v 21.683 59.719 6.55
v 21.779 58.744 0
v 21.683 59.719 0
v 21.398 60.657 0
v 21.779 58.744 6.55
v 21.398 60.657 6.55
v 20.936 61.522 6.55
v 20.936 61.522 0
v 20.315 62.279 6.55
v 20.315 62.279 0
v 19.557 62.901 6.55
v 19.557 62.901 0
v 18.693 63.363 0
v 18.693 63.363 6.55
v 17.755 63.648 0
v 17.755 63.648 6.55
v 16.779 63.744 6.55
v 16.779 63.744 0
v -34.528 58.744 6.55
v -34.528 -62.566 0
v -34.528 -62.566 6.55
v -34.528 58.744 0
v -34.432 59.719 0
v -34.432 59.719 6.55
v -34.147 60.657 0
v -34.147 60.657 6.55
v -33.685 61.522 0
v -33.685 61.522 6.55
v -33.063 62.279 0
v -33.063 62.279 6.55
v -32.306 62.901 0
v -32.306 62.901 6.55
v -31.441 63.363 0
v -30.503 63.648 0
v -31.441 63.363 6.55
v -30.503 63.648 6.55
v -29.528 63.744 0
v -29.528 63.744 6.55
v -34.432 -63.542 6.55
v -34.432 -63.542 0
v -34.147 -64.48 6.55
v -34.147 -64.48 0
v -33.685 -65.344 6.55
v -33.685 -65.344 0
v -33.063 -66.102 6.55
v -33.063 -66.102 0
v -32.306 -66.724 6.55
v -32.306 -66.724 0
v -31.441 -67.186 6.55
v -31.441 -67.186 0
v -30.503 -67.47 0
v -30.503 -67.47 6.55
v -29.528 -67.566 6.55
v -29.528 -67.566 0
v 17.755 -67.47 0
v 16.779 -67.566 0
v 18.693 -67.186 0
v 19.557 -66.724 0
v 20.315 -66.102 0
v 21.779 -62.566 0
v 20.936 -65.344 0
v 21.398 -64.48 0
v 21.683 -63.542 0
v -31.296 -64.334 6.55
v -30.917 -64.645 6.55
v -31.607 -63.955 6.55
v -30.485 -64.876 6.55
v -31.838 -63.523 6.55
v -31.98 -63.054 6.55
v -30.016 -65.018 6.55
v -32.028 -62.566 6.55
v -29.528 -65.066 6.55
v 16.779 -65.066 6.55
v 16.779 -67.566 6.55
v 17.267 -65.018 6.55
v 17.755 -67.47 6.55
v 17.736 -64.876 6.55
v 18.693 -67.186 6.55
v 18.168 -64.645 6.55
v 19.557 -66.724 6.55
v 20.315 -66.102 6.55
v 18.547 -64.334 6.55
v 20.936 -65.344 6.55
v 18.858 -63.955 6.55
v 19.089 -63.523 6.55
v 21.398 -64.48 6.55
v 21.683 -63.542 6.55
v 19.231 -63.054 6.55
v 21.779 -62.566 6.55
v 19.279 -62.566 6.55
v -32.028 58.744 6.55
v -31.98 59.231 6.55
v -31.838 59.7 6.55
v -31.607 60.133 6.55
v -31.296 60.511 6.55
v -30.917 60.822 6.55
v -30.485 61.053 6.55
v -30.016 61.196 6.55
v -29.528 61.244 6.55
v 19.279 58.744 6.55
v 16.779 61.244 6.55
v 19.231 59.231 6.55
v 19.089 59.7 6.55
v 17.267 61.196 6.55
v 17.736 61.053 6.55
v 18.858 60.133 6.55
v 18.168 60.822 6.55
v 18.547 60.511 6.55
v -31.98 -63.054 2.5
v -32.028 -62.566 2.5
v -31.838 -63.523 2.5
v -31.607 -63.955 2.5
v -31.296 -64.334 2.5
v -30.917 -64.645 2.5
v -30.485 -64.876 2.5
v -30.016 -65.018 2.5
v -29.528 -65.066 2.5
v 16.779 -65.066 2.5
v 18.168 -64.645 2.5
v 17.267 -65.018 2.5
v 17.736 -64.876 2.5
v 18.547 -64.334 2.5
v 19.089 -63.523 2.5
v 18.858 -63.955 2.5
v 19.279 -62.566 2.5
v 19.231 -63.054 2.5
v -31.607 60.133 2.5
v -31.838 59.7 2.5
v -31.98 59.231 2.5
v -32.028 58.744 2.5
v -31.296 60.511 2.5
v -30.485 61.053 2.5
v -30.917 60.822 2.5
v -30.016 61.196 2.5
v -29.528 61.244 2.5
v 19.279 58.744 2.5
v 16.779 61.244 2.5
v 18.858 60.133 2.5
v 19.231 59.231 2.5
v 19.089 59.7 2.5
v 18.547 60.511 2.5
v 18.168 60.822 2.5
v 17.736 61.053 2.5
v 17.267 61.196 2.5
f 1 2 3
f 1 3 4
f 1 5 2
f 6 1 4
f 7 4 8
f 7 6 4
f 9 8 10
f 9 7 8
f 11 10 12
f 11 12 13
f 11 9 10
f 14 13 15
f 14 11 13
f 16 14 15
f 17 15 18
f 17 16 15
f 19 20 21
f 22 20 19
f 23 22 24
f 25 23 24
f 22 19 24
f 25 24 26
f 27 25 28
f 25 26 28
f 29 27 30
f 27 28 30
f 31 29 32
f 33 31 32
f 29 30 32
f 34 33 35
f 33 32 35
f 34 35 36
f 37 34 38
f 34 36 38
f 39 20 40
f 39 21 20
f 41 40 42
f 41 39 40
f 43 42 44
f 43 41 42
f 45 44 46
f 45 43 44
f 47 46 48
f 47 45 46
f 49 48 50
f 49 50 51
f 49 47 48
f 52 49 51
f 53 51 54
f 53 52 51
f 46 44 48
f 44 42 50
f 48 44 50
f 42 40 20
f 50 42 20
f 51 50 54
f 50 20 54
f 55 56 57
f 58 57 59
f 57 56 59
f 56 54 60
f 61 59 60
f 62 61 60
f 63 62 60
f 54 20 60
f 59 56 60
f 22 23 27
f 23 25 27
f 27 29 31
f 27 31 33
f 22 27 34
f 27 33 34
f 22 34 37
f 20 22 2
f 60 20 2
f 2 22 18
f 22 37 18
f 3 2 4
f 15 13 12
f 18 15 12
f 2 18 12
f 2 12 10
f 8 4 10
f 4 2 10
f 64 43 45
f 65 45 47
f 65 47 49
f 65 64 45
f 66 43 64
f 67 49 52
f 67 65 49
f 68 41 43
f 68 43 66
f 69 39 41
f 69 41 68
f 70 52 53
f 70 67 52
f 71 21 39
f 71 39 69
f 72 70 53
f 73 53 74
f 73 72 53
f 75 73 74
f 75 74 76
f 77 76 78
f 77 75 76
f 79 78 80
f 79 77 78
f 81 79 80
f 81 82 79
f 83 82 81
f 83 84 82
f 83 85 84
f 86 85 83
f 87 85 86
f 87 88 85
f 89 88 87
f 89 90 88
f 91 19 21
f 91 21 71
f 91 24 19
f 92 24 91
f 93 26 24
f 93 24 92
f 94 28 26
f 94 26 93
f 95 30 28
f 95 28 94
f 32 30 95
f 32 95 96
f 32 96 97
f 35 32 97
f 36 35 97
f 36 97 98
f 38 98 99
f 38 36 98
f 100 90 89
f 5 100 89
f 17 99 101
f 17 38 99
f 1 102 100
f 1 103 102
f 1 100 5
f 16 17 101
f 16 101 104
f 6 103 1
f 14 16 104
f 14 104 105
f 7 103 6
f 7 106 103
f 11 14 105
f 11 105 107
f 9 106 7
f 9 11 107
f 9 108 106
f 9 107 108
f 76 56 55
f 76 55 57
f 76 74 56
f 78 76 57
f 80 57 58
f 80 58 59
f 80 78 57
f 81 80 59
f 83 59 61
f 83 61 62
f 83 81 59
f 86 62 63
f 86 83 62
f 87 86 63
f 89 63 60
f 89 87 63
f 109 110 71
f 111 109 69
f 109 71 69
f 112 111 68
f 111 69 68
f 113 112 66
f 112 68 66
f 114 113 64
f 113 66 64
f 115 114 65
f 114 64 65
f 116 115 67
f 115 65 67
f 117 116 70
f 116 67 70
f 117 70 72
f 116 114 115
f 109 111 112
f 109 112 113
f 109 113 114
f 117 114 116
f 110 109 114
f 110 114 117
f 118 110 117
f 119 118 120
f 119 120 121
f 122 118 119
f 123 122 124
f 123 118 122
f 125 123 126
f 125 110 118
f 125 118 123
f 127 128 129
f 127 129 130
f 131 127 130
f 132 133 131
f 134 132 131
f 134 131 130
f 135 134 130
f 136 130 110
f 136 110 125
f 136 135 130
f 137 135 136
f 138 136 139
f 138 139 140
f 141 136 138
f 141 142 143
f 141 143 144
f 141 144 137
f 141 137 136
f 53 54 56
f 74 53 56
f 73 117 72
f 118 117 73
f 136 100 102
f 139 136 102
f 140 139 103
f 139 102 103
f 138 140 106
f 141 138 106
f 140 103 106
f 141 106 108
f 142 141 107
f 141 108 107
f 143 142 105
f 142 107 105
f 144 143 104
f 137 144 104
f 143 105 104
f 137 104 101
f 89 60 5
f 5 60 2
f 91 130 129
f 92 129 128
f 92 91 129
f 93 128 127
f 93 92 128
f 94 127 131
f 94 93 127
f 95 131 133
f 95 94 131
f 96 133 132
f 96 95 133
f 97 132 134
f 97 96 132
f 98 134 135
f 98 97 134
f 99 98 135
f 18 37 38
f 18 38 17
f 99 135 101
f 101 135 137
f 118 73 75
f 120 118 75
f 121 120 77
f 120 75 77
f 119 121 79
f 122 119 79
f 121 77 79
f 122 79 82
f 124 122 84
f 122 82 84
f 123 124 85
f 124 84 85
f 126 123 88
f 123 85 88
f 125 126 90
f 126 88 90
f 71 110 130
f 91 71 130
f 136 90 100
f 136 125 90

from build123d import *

# Parameters (mm, degrees)
F0_W     = 56.306915
F0_H     = 131.31
F1_DEPTH = 6.55
F2_R     = 5
F3_T     = -2.5


with BuildPart() as f1:
    # F0 (on Top) → F1 (new body)
    with BuildSketch(Plane.XY):
        with Locations((-6.374369, -1.911319)):
            Rectangle(F0_W, F0_H)
    extrude(amount=F1_DEPTH)

    # F2
    f2_edges = [f1.edges().sort_by_distance(p)[0] for p in [
        (21.779088, 63.743681, 3.275),
        (21.779088, -67.566319, 3.275),
        (-34.527827, -67.566319, 3.275),
        (-34.527827, 63.743681, 3.275),
    ]]
    fillet(f2_edges, radius=F2_R)

    # F3
    f3_openings = [f1.faces().sort_by_distance(p)[0] for p in [
        (-6.374369, -1.911319, 6.55),
    ]]
    offset(amount=F3_T, openings=f3_openings)


solid = f1.part
